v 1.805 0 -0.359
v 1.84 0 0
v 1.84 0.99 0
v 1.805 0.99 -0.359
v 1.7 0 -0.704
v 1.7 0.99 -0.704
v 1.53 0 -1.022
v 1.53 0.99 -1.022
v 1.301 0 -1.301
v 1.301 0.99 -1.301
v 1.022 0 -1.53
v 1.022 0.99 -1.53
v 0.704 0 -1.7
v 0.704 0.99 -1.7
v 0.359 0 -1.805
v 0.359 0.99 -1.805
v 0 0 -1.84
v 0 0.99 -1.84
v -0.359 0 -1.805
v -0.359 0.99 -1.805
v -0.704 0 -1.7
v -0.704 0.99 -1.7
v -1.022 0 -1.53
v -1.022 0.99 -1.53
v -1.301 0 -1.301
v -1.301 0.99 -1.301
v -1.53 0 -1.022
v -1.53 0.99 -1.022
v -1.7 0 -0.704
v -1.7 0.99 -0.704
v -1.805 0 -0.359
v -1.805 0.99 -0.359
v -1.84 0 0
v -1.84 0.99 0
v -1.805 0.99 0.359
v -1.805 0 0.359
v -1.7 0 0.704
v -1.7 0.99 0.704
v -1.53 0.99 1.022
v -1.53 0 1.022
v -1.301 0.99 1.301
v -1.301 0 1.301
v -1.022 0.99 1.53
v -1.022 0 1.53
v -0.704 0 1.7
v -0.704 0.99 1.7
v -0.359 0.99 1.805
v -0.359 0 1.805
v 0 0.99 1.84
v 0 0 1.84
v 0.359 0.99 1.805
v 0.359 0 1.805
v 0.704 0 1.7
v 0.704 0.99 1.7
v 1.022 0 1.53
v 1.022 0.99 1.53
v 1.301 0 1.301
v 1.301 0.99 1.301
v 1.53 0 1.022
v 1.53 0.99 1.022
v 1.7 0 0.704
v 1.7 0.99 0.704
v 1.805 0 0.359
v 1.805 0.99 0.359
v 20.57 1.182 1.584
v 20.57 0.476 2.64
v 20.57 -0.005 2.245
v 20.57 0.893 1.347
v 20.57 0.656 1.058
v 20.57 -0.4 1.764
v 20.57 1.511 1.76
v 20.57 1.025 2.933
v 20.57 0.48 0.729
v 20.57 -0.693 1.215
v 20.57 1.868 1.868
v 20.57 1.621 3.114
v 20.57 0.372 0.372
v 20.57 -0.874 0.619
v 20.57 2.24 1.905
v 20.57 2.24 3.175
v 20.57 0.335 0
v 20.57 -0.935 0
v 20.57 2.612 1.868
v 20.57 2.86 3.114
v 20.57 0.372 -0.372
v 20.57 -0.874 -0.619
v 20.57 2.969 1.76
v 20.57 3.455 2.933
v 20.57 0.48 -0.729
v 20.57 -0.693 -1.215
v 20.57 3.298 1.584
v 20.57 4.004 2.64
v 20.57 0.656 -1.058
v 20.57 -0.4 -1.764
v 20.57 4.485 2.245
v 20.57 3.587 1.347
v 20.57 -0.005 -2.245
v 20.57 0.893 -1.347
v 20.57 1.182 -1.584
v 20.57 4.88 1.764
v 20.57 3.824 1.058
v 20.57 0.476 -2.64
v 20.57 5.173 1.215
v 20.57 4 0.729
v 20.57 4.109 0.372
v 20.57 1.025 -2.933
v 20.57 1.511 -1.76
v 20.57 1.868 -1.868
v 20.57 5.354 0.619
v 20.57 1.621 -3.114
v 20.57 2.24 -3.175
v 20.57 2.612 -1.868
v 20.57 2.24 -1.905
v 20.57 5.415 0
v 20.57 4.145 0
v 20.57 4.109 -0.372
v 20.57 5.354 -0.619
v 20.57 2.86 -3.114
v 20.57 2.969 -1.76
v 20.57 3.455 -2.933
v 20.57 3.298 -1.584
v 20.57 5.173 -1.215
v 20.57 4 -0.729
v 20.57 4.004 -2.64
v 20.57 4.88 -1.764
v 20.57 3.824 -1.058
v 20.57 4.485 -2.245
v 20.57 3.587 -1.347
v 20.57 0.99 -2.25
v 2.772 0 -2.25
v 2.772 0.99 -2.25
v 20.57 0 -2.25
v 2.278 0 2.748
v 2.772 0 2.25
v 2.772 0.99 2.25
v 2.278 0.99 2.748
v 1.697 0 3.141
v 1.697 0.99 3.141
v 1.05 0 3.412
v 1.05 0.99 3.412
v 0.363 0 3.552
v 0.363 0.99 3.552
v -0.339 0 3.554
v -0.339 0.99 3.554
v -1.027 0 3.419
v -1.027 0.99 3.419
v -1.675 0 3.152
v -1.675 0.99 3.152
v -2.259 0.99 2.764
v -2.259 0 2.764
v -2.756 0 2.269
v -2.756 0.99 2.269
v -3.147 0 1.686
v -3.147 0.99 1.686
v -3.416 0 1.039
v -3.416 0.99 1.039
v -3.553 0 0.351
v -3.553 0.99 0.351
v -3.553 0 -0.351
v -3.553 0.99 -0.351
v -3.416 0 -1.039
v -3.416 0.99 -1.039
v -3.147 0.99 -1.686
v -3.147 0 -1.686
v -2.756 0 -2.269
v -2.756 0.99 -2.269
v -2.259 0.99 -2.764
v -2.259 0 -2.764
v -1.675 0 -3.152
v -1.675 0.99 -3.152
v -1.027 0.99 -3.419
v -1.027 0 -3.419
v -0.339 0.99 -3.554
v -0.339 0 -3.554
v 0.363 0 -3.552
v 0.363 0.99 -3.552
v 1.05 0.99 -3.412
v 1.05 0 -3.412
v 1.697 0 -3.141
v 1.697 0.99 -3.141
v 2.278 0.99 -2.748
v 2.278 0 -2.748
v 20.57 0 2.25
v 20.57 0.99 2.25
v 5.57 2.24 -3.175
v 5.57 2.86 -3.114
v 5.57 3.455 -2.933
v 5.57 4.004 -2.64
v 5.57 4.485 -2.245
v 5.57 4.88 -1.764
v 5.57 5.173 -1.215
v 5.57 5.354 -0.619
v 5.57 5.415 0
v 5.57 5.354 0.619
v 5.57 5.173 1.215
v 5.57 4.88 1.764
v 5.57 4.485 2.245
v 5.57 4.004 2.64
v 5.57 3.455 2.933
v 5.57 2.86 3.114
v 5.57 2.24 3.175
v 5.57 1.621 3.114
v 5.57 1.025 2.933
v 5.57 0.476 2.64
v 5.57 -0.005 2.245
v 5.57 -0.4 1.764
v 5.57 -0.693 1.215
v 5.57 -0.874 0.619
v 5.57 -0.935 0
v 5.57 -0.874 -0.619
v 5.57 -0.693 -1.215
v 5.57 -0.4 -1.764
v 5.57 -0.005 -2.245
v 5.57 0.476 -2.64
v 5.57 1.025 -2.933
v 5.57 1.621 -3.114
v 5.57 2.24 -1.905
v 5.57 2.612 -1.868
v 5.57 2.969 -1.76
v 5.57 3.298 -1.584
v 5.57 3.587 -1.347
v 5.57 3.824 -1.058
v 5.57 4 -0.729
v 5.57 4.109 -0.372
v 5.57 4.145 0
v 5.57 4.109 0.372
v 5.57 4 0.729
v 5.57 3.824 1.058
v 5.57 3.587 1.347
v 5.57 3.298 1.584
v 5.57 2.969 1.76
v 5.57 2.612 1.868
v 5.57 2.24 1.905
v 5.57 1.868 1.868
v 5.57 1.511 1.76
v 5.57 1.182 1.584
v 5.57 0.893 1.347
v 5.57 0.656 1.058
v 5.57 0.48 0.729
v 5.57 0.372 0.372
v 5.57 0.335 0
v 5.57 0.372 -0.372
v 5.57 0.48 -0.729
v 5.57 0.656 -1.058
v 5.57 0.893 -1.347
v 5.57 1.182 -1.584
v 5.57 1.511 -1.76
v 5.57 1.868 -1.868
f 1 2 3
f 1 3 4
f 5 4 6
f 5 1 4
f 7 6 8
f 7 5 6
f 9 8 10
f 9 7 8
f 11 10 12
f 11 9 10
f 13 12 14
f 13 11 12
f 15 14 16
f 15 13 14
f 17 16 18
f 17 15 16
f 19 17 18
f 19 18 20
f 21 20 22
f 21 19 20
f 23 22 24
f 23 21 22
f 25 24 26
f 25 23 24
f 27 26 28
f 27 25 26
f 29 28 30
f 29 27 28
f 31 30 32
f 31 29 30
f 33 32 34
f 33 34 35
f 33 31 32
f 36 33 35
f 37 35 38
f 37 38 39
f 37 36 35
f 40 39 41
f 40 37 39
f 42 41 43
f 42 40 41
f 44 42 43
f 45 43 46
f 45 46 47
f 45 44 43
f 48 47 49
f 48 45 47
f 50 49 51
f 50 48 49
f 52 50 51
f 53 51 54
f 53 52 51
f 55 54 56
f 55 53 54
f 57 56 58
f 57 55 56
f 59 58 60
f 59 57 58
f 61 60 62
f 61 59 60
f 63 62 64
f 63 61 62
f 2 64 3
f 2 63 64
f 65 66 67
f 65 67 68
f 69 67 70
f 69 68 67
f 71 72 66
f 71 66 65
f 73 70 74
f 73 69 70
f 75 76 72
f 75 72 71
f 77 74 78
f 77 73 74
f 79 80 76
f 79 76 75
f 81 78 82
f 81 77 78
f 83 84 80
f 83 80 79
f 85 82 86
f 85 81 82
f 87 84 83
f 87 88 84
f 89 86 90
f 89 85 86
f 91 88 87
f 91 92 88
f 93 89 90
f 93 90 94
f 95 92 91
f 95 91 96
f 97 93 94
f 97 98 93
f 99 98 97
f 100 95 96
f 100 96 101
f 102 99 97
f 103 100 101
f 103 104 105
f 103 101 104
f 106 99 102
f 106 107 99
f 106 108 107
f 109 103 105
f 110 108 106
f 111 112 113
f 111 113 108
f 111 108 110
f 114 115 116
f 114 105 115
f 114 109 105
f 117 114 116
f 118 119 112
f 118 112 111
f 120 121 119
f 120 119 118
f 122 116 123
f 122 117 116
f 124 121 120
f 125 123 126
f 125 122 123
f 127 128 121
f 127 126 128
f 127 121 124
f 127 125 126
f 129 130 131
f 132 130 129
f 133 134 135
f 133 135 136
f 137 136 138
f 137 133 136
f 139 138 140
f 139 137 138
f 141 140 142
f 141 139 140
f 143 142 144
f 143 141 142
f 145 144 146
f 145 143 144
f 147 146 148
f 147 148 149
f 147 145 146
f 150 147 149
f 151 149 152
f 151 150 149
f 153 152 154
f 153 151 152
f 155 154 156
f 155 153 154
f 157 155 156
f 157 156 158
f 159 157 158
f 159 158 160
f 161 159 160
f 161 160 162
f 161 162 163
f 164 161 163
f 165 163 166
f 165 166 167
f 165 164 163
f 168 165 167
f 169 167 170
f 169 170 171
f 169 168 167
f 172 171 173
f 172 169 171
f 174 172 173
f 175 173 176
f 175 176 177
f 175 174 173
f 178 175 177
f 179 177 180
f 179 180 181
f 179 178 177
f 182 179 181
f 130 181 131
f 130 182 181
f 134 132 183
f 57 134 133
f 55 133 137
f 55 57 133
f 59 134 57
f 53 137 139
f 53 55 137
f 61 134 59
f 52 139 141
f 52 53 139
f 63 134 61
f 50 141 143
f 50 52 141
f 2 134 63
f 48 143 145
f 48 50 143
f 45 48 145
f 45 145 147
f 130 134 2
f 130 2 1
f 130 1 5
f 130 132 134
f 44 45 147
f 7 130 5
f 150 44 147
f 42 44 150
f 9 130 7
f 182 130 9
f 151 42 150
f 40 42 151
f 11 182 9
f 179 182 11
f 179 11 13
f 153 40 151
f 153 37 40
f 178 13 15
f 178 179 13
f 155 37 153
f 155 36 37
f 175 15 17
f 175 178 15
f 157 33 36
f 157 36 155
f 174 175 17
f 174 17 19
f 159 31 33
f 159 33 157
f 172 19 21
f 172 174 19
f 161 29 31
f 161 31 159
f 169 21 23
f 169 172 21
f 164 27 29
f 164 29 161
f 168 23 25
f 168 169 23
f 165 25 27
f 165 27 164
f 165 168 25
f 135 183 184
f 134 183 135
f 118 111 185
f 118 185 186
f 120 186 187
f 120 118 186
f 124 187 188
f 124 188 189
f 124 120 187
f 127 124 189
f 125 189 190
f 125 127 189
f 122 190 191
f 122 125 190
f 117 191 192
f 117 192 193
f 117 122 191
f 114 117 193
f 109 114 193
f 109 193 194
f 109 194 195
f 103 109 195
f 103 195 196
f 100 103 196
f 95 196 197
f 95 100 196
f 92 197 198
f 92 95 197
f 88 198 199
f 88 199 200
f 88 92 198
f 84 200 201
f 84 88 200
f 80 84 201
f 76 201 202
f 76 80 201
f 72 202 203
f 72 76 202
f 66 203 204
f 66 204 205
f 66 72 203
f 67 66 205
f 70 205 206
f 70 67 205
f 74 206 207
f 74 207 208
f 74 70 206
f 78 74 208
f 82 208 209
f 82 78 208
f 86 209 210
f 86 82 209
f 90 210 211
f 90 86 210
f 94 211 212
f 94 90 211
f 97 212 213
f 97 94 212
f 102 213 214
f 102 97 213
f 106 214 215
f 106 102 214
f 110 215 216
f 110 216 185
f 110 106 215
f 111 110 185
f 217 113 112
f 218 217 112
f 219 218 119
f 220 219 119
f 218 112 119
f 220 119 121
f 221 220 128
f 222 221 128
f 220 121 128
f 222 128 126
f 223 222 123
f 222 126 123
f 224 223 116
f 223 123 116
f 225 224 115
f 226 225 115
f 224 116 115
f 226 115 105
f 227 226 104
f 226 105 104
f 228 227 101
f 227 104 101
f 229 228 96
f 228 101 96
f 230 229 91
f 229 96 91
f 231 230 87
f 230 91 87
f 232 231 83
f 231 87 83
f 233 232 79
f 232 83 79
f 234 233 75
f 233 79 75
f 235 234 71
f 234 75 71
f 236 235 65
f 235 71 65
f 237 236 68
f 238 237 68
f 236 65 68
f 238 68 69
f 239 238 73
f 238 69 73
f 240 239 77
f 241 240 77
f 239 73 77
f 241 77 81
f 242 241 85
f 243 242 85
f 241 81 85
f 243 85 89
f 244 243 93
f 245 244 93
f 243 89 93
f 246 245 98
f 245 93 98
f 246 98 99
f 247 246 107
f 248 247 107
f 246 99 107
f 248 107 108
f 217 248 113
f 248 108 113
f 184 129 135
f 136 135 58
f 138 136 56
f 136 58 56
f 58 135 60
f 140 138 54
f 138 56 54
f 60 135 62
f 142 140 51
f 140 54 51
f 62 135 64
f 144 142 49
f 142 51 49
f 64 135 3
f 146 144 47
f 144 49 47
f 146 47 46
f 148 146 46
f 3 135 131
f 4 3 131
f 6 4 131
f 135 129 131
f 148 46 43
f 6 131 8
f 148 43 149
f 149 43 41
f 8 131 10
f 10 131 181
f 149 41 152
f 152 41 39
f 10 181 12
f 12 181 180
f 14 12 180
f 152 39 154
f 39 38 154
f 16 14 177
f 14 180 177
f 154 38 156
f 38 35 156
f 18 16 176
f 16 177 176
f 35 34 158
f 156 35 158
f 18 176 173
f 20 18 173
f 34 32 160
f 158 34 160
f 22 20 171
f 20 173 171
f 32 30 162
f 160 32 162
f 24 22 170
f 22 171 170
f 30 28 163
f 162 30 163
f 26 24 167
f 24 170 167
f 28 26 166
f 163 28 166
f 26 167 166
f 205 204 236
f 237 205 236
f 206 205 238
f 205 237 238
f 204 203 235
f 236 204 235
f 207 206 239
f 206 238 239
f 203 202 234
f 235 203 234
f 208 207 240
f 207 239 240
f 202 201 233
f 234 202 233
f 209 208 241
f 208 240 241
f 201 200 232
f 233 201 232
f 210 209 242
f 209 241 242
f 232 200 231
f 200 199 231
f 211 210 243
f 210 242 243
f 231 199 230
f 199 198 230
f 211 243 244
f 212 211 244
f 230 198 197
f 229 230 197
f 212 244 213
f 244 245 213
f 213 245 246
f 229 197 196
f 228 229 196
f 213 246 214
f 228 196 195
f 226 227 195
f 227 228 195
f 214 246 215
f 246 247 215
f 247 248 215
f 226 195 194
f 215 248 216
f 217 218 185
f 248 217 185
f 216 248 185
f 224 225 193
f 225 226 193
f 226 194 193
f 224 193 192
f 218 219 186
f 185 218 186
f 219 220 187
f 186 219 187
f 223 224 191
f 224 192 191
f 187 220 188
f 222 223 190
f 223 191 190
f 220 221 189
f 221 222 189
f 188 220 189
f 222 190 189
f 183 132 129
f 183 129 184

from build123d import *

# Parameters (mm, degrees)
SKIZZE1_R                       = 1.84
AUFSATZ_LINEAR_AUSTRAGEN1_DEPTH = 0.99
SKIZZE2_R                       = 3.175
SKIZZE2_R_2                     = 1.905
AUFSATZ_LINEAR_AUSTRAGEN2_DEPTH = 15


with BuildPart() as part:
    # Skizze1 → Aufsatz-Linear austragen1 (new body)
    with BuildSketch(Plane(origin=(0, 0, 0), x_dir=(1, 0, 0), z_dir=(0, 1, 0))):
        with BuildLine():
            Line((2.771714271, 2.25), (20.57, 2.25))
            Line((20.57, 2.25), (20.57, -2.25))
            Line((20.57, -2.25), (2.771714271, -2.25))
            ThreePointArc((2.771714271, -2.25), (-3.57, 0), (2.771714271, 2.25))
        make_face()
        Circle(SKIZZE1_R, mode=Mode.SUBTRACT)
    extrude(amount=AUFSATZ_LINEAR_AUSTRAGEN1_DEPTH)


with BuildPart() as body_2:
    # Skizze2 → Aufsatz-Linear austragen2 (new body)
    with BuildSketch(Plane(origin=(20.57, 0, 0), x_dir=(0, 0, -1), z_dir=(1, 0, 0))):
        with Locations((0, 2.240117184)):
            Circle(SKIZZE2_R)
        with Locations((0, 2.240117184)):
            Circle(SKIZZE2_R_2, mode=Mode.SUBTRACT)
    extrude(amount=-AUFSATZ_LINEAR_AUSTRAGEN2_DEPTH)


solid = Compound([part.part, body_2.part])
